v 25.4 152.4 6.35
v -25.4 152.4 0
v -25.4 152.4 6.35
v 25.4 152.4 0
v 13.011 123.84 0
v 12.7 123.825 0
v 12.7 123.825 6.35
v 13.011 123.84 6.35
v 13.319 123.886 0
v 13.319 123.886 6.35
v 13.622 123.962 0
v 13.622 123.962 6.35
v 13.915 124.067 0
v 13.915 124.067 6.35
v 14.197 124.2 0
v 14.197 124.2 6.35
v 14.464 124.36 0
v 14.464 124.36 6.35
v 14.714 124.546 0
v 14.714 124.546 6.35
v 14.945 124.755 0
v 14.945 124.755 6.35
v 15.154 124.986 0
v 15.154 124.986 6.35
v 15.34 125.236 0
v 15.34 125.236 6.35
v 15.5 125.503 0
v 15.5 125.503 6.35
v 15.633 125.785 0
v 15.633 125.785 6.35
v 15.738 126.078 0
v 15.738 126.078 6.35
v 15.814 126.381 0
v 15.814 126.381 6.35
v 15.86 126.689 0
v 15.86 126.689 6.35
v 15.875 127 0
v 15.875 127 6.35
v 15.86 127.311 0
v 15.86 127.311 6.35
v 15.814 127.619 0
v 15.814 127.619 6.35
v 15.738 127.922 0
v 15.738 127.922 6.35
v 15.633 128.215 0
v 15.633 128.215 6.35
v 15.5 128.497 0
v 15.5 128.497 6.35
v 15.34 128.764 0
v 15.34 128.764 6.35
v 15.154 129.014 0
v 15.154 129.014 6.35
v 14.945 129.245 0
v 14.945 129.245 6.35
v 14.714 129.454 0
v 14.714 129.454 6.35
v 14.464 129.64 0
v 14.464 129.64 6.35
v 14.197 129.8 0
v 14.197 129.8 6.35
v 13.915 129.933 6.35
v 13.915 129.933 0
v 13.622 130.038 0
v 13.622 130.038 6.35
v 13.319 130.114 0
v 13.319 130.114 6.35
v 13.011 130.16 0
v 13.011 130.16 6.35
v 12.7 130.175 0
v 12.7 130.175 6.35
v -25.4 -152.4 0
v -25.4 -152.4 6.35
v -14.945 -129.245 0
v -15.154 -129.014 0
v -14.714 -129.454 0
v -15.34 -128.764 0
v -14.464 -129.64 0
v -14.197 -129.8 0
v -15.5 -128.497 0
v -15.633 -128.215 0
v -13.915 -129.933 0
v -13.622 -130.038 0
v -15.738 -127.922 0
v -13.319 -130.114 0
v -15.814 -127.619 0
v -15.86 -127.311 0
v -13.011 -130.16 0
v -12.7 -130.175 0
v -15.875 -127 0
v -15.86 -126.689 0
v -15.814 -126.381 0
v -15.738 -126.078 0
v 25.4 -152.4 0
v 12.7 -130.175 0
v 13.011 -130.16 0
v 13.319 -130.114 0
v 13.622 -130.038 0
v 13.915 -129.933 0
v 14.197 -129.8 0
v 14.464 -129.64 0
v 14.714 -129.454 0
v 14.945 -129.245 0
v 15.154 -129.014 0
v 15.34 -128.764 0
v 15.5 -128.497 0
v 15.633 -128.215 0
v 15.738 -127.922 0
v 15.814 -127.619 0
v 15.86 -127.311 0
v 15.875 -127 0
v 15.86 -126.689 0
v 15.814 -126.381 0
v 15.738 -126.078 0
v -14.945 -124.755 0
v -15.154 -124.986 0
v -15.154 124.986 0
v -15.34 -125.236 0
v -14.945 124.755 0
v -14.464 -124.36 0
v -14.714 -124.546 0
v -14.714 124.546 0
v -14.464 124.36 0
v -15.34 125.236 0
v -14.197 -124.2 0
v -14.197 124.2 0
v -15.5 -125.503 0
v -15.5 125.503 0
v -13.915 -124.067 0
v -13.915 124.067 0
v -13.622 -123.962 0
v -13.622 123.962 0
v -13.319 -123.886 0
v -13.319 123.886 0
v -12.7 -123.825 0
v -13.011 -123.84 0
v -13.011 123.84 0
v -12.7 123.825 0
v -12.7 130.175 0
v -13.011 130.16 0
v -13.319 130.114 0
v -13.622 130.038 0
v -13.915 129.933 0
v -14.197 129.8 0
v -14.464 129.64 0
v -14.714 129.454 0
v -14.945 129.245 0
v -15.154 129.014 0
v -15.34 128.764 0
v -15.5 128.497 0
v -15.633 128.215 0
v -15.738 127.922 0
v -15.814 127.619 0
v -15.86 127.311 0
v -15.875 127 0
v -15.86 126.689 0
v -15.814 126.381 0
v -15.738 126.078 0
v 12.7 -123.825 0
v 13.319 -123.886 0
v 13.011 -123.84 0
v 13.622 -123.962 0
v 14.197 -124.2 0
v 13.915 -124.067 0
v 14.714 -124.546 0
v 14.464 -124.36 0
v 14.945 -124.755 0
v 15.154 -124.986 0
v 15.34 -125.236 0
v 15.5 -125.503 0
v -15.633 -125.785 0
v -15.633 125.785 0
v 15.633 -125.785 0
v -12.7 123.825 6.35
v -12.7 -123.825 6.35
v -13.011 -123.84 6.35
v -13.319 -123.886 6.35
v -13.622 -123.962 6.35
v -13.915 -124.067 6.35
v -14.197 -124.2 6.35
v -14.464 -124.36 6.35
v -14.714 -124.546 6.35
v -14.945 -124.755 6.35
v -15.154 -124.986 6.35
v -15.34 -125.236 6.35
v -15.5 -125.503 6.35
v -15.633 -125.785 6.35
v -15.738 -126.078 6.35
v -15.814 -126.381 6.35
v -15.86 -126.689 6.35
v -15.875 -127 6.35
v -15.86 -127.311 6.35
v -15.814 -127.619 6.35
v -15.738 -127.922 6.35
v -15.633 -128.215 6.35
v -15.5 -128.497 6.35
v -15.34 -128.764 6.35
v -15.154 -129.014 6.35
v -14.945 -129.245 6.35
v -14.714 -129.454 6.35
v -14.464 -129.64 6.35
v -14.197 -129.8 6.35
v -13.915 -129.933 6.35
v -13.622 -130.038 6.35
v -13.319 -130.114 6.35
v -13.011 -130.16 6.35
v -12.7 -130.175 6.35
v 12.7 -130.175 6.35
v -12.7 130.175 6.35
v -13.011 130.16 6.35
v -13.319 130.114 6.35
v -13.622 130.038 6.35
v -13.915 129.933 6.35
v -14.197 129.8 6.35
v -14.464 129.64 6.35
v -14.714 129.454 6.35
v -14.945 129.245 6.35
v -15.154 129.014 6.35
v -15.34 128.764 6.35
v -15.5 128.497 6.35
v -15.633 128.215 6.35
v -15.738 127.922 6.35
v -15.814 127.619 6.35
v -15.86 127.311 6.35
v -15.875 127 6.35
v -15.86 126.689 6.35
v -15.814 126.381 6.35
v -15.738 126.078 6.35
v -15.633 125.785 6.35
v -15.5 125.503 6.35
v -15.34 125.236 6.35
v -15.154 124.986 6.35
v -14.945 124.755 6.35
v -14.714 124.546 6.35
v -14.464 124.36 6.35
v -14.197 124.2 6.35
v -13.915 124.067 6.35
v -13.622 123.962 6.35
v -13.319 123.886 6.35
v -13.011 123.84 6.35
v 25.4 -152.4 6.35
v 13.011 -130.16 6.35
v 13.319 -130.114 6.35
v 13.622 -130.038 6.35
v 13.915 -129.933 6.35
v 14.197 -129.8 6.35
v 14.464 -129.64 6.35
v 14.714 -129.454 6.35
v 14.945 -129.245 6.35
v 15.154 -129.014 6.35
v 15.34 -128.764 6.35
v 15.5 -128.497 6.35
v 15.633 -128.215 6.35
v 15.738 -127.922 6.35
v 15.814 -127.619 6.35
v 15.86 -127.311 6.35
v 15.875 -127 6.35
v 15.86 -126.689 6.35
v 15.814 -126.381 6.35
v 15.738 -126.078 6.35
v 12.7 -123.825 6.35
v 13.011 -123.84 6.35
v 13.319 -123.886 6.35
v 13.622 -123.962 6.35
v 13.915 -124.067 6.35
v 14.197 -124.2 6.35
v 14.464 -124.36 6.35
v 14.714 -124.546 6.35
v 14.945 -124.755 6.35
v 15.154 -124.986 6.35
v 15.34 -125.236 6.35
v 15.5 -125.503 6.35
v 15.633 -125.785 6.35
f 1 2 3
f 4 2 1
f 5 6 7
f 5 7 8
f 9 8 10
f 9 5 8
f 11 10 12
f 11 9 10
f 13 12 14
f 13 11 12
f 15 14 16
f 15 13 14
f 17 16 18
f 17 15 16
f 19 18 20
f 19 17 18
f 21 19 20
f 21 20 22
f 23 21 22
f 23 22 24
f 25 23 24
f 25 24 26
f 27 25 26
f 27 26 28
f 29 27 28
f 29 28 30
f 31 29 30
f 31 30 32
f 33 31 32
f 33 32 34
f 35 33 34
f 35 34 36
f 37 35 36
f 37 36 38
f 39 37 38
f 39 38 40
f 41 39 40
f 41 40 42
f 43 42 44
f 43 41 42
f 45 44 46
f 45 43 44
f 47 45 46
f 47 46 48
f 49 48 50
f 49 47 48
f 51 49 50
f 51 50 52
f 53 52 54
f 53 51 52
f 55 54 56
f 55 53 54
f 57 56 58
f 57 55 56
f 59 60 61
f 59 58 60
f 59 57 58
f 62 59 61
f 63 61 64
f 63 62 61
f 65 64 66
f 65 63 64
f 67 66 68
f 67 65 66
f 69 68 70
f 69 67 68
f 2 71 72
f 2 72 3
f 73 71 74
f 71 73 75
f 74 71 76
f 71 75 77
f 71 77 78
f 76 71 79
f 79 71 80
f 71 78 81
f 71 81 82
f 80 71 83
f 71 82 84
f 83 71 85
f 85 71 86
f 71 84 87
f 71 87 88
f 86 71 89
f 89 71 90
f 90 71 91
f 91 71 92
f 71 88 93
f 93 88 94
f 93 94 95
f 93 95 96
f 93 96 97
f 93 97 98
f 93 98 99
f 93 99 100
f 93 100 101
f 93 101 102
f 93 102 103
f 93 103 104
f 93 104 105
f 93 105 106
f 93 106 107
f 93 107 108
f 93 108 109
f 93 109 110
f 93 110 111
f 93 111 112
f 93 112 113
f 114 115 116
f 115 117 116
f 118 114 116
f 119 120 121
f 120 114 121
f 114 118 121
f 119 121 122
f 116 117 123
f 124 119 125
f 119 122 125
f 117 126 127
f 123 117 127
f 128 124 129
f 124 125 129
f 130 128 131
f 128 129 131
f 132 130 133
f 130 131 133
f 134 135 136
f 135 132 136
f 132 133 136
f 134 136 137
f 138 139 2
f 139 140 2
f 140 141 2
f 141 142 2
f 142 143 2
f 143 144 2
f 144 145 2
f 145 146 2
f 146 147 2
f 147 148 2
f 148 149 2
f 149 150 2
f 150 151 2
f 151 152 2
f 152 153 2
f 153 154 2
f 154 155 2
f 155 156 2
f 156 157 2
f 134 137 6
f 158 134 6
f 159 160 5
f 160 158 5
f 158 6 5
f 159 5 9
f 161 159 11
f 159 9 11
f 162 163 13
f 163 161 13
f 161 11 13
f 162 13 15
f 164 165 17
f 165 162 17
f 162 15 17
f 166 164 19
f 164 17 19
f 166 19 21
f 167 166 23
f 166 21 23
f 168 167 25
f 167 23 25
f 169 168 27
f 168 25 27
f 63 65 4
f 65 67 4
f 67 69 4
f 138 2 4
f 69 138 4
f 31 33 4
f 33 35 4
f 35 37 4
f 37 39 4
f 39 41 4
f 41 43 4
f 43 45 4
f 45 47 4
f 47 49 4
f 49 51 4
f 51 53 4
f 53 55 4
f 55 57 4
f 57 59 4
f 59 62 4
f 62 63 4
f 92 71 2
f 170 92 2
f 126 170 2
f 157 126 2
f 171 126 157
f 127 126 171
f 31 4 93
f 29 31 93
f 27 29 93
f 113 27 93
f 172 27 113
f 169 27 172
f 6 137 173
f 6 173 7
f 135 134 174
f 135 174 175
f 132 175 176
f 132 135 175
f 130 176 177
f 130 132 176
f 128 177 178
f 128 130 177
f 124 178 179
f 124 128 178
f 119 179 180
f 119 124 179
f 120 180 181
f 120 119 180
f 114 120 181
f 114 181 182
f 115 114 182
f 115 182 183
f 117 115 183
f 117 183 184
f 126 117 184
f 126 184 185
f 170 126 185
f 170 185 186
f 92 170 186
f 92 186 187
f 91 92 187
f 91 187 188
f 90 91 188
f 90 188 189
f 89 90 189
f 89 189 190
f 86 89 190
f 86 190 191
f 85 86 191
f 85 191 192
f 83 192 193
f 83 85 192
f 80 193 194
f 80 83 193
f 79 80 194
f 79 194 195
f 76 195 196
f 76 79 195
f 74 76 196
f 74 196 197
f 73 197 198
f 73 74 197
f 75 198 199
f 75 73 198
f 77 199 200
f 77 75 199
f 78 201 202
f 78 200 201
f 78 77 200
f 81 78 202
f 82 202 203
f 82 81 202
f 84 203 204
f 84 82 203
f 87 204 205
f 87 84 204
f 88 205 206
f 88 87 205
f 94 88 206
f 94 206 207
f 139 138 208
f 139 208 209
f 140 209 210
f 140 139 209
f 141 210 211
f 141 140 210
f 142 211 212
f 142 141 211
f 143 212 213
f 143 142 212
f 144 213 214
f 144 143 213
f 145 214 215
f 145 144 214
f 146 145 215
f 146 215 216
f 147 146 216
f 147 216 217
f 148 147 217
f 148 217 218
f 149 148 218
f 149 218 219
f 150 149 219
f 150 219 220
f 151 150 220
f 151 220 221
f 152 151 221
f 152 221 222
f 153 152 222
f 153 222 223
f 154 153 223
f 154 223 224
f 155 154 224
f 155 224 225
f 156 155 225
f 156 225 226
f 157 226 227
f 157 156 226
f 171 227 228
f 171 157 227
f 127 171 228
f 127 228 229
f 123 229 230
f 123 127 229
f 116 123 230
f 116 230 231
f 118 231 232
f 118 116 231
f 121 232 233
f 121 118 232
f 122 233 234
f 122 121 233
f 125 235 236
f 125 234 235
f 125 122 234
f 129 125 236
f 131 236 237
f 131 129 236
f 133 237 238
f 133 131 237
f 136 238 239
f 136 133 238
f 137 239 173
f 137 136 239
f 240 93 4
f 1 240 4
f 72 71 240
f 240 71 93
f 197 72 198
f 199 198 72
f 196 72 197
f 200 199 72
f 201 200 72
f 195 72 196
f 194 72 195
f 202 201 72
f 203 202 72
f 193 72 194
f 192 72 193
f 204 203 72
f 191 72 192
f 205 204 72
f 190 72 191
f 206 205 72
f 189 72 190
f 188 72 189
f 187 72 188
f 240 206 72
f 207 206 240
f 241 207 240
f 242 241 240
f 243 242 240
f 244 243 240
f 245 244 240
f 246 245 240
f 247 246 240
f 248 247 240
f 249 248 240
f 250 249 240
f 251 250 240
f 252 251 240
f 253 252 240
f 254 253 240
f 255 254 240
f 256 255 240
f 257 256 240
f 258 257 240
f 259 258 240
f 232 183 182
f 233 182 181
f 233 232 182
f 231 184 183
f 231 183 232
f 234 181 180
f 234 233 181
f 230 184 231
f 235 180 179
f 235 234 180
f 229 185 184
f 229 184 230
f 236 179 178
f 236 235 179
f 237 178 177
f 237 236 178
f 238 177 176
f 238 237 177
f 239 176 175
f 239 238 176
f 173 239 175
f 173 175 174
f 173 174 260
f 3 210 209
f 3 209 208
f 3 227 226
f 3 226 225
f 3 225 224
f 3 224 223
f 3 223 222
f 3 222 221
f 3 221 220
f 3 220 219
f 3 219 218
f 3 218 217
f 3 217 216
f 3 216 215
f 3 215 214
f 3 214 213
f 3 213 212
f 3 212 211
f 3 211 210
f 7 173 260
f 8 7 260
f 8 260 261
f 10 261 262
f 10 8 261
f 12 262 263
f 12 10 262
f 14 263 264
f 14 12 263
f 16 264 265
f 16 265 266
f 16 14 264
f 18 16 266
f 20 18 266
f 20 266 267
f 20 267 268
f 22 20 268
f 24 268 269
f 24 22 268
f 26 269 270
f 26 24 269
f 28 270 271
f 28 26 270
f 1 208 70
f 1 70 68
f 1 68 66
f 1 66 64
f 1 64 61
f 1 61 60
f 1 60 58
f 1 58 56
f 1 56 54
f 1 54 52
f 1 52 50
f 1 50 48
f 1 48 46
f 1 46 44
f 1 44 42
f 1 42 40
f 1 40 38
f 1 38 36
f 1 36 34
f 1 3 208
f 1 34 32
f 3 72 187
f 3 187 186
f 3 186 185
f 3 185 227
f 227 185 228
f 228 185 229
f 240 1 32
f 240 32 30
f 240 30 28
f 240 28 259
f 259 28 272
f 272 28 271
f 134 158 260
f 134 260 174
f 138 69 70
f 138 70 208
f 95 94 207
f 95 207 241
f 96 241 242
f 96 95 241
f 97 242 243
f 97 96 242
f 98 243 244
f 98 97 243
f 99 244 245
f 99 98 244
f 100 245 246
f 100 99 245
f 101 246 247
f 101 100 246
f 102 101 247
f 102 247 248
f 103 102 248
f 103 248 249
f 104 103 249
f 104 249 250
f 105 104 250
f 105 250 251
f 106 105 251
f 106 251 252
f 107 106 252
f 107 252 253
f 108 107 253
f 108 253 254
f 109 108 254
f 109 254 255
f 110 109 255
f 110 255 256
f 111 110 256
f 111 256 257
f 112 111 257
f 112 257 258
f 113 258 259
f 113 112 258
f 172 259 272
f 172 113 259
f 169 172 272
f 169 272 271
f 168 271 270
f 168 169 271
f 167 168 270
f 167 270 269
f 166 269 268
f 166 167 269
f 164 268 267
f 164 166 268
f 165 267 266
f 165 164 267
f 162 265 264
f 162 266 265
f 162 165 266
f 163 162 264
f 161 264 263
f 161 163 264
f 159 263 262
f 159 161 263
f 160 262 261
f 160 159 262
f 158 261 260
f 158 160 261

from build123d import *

# Parameters (mm, degrees)
F0_W     = 50.8
F0_H     = 304.8
F1_DEPTH = 6.35
F3_DEPTH = 25.4


with BuildPart() as f1:
    # F0 (on Top) → F1 (new body)
    with BuildSketch(Plane.XY):
        Rectangle(F0_W, F0_H)
    extrude(amount=F1_DEPTH)

    # F2 (on Top) → F3 (cut)
    with BuildSketch(Plane.XY):
        with BuildLine():
            Line((12.7, 130.175), (-12.7, 130.175))
            ThreePointArc((-12.7, 130.175), (-15.875, 127), (-12.7, 123.825))
            Line((-12.7, 123.825), (12.7, 123.825))
            ThreePointArc((12.7, 123.825), (15.875, 127), (12.7, 130.175))
        make_face()
        with BuildLine():
            Line((12.7, -123.825), (-12.7, -123.825))
            ThreePointArc((-12.7, -123.825), (-15.875, -127), (-12.7, -130.175))
            Line((-12.7, -130.175), (12.7, -130.175))
            ThreePointArc((12.7, -130.175), (15.875, -127), (12.7, -123.825))
        make_face()
    extrude(amount=F3_DEPTH, mode=Mode.SUBTRACT)


solid = f1.part
